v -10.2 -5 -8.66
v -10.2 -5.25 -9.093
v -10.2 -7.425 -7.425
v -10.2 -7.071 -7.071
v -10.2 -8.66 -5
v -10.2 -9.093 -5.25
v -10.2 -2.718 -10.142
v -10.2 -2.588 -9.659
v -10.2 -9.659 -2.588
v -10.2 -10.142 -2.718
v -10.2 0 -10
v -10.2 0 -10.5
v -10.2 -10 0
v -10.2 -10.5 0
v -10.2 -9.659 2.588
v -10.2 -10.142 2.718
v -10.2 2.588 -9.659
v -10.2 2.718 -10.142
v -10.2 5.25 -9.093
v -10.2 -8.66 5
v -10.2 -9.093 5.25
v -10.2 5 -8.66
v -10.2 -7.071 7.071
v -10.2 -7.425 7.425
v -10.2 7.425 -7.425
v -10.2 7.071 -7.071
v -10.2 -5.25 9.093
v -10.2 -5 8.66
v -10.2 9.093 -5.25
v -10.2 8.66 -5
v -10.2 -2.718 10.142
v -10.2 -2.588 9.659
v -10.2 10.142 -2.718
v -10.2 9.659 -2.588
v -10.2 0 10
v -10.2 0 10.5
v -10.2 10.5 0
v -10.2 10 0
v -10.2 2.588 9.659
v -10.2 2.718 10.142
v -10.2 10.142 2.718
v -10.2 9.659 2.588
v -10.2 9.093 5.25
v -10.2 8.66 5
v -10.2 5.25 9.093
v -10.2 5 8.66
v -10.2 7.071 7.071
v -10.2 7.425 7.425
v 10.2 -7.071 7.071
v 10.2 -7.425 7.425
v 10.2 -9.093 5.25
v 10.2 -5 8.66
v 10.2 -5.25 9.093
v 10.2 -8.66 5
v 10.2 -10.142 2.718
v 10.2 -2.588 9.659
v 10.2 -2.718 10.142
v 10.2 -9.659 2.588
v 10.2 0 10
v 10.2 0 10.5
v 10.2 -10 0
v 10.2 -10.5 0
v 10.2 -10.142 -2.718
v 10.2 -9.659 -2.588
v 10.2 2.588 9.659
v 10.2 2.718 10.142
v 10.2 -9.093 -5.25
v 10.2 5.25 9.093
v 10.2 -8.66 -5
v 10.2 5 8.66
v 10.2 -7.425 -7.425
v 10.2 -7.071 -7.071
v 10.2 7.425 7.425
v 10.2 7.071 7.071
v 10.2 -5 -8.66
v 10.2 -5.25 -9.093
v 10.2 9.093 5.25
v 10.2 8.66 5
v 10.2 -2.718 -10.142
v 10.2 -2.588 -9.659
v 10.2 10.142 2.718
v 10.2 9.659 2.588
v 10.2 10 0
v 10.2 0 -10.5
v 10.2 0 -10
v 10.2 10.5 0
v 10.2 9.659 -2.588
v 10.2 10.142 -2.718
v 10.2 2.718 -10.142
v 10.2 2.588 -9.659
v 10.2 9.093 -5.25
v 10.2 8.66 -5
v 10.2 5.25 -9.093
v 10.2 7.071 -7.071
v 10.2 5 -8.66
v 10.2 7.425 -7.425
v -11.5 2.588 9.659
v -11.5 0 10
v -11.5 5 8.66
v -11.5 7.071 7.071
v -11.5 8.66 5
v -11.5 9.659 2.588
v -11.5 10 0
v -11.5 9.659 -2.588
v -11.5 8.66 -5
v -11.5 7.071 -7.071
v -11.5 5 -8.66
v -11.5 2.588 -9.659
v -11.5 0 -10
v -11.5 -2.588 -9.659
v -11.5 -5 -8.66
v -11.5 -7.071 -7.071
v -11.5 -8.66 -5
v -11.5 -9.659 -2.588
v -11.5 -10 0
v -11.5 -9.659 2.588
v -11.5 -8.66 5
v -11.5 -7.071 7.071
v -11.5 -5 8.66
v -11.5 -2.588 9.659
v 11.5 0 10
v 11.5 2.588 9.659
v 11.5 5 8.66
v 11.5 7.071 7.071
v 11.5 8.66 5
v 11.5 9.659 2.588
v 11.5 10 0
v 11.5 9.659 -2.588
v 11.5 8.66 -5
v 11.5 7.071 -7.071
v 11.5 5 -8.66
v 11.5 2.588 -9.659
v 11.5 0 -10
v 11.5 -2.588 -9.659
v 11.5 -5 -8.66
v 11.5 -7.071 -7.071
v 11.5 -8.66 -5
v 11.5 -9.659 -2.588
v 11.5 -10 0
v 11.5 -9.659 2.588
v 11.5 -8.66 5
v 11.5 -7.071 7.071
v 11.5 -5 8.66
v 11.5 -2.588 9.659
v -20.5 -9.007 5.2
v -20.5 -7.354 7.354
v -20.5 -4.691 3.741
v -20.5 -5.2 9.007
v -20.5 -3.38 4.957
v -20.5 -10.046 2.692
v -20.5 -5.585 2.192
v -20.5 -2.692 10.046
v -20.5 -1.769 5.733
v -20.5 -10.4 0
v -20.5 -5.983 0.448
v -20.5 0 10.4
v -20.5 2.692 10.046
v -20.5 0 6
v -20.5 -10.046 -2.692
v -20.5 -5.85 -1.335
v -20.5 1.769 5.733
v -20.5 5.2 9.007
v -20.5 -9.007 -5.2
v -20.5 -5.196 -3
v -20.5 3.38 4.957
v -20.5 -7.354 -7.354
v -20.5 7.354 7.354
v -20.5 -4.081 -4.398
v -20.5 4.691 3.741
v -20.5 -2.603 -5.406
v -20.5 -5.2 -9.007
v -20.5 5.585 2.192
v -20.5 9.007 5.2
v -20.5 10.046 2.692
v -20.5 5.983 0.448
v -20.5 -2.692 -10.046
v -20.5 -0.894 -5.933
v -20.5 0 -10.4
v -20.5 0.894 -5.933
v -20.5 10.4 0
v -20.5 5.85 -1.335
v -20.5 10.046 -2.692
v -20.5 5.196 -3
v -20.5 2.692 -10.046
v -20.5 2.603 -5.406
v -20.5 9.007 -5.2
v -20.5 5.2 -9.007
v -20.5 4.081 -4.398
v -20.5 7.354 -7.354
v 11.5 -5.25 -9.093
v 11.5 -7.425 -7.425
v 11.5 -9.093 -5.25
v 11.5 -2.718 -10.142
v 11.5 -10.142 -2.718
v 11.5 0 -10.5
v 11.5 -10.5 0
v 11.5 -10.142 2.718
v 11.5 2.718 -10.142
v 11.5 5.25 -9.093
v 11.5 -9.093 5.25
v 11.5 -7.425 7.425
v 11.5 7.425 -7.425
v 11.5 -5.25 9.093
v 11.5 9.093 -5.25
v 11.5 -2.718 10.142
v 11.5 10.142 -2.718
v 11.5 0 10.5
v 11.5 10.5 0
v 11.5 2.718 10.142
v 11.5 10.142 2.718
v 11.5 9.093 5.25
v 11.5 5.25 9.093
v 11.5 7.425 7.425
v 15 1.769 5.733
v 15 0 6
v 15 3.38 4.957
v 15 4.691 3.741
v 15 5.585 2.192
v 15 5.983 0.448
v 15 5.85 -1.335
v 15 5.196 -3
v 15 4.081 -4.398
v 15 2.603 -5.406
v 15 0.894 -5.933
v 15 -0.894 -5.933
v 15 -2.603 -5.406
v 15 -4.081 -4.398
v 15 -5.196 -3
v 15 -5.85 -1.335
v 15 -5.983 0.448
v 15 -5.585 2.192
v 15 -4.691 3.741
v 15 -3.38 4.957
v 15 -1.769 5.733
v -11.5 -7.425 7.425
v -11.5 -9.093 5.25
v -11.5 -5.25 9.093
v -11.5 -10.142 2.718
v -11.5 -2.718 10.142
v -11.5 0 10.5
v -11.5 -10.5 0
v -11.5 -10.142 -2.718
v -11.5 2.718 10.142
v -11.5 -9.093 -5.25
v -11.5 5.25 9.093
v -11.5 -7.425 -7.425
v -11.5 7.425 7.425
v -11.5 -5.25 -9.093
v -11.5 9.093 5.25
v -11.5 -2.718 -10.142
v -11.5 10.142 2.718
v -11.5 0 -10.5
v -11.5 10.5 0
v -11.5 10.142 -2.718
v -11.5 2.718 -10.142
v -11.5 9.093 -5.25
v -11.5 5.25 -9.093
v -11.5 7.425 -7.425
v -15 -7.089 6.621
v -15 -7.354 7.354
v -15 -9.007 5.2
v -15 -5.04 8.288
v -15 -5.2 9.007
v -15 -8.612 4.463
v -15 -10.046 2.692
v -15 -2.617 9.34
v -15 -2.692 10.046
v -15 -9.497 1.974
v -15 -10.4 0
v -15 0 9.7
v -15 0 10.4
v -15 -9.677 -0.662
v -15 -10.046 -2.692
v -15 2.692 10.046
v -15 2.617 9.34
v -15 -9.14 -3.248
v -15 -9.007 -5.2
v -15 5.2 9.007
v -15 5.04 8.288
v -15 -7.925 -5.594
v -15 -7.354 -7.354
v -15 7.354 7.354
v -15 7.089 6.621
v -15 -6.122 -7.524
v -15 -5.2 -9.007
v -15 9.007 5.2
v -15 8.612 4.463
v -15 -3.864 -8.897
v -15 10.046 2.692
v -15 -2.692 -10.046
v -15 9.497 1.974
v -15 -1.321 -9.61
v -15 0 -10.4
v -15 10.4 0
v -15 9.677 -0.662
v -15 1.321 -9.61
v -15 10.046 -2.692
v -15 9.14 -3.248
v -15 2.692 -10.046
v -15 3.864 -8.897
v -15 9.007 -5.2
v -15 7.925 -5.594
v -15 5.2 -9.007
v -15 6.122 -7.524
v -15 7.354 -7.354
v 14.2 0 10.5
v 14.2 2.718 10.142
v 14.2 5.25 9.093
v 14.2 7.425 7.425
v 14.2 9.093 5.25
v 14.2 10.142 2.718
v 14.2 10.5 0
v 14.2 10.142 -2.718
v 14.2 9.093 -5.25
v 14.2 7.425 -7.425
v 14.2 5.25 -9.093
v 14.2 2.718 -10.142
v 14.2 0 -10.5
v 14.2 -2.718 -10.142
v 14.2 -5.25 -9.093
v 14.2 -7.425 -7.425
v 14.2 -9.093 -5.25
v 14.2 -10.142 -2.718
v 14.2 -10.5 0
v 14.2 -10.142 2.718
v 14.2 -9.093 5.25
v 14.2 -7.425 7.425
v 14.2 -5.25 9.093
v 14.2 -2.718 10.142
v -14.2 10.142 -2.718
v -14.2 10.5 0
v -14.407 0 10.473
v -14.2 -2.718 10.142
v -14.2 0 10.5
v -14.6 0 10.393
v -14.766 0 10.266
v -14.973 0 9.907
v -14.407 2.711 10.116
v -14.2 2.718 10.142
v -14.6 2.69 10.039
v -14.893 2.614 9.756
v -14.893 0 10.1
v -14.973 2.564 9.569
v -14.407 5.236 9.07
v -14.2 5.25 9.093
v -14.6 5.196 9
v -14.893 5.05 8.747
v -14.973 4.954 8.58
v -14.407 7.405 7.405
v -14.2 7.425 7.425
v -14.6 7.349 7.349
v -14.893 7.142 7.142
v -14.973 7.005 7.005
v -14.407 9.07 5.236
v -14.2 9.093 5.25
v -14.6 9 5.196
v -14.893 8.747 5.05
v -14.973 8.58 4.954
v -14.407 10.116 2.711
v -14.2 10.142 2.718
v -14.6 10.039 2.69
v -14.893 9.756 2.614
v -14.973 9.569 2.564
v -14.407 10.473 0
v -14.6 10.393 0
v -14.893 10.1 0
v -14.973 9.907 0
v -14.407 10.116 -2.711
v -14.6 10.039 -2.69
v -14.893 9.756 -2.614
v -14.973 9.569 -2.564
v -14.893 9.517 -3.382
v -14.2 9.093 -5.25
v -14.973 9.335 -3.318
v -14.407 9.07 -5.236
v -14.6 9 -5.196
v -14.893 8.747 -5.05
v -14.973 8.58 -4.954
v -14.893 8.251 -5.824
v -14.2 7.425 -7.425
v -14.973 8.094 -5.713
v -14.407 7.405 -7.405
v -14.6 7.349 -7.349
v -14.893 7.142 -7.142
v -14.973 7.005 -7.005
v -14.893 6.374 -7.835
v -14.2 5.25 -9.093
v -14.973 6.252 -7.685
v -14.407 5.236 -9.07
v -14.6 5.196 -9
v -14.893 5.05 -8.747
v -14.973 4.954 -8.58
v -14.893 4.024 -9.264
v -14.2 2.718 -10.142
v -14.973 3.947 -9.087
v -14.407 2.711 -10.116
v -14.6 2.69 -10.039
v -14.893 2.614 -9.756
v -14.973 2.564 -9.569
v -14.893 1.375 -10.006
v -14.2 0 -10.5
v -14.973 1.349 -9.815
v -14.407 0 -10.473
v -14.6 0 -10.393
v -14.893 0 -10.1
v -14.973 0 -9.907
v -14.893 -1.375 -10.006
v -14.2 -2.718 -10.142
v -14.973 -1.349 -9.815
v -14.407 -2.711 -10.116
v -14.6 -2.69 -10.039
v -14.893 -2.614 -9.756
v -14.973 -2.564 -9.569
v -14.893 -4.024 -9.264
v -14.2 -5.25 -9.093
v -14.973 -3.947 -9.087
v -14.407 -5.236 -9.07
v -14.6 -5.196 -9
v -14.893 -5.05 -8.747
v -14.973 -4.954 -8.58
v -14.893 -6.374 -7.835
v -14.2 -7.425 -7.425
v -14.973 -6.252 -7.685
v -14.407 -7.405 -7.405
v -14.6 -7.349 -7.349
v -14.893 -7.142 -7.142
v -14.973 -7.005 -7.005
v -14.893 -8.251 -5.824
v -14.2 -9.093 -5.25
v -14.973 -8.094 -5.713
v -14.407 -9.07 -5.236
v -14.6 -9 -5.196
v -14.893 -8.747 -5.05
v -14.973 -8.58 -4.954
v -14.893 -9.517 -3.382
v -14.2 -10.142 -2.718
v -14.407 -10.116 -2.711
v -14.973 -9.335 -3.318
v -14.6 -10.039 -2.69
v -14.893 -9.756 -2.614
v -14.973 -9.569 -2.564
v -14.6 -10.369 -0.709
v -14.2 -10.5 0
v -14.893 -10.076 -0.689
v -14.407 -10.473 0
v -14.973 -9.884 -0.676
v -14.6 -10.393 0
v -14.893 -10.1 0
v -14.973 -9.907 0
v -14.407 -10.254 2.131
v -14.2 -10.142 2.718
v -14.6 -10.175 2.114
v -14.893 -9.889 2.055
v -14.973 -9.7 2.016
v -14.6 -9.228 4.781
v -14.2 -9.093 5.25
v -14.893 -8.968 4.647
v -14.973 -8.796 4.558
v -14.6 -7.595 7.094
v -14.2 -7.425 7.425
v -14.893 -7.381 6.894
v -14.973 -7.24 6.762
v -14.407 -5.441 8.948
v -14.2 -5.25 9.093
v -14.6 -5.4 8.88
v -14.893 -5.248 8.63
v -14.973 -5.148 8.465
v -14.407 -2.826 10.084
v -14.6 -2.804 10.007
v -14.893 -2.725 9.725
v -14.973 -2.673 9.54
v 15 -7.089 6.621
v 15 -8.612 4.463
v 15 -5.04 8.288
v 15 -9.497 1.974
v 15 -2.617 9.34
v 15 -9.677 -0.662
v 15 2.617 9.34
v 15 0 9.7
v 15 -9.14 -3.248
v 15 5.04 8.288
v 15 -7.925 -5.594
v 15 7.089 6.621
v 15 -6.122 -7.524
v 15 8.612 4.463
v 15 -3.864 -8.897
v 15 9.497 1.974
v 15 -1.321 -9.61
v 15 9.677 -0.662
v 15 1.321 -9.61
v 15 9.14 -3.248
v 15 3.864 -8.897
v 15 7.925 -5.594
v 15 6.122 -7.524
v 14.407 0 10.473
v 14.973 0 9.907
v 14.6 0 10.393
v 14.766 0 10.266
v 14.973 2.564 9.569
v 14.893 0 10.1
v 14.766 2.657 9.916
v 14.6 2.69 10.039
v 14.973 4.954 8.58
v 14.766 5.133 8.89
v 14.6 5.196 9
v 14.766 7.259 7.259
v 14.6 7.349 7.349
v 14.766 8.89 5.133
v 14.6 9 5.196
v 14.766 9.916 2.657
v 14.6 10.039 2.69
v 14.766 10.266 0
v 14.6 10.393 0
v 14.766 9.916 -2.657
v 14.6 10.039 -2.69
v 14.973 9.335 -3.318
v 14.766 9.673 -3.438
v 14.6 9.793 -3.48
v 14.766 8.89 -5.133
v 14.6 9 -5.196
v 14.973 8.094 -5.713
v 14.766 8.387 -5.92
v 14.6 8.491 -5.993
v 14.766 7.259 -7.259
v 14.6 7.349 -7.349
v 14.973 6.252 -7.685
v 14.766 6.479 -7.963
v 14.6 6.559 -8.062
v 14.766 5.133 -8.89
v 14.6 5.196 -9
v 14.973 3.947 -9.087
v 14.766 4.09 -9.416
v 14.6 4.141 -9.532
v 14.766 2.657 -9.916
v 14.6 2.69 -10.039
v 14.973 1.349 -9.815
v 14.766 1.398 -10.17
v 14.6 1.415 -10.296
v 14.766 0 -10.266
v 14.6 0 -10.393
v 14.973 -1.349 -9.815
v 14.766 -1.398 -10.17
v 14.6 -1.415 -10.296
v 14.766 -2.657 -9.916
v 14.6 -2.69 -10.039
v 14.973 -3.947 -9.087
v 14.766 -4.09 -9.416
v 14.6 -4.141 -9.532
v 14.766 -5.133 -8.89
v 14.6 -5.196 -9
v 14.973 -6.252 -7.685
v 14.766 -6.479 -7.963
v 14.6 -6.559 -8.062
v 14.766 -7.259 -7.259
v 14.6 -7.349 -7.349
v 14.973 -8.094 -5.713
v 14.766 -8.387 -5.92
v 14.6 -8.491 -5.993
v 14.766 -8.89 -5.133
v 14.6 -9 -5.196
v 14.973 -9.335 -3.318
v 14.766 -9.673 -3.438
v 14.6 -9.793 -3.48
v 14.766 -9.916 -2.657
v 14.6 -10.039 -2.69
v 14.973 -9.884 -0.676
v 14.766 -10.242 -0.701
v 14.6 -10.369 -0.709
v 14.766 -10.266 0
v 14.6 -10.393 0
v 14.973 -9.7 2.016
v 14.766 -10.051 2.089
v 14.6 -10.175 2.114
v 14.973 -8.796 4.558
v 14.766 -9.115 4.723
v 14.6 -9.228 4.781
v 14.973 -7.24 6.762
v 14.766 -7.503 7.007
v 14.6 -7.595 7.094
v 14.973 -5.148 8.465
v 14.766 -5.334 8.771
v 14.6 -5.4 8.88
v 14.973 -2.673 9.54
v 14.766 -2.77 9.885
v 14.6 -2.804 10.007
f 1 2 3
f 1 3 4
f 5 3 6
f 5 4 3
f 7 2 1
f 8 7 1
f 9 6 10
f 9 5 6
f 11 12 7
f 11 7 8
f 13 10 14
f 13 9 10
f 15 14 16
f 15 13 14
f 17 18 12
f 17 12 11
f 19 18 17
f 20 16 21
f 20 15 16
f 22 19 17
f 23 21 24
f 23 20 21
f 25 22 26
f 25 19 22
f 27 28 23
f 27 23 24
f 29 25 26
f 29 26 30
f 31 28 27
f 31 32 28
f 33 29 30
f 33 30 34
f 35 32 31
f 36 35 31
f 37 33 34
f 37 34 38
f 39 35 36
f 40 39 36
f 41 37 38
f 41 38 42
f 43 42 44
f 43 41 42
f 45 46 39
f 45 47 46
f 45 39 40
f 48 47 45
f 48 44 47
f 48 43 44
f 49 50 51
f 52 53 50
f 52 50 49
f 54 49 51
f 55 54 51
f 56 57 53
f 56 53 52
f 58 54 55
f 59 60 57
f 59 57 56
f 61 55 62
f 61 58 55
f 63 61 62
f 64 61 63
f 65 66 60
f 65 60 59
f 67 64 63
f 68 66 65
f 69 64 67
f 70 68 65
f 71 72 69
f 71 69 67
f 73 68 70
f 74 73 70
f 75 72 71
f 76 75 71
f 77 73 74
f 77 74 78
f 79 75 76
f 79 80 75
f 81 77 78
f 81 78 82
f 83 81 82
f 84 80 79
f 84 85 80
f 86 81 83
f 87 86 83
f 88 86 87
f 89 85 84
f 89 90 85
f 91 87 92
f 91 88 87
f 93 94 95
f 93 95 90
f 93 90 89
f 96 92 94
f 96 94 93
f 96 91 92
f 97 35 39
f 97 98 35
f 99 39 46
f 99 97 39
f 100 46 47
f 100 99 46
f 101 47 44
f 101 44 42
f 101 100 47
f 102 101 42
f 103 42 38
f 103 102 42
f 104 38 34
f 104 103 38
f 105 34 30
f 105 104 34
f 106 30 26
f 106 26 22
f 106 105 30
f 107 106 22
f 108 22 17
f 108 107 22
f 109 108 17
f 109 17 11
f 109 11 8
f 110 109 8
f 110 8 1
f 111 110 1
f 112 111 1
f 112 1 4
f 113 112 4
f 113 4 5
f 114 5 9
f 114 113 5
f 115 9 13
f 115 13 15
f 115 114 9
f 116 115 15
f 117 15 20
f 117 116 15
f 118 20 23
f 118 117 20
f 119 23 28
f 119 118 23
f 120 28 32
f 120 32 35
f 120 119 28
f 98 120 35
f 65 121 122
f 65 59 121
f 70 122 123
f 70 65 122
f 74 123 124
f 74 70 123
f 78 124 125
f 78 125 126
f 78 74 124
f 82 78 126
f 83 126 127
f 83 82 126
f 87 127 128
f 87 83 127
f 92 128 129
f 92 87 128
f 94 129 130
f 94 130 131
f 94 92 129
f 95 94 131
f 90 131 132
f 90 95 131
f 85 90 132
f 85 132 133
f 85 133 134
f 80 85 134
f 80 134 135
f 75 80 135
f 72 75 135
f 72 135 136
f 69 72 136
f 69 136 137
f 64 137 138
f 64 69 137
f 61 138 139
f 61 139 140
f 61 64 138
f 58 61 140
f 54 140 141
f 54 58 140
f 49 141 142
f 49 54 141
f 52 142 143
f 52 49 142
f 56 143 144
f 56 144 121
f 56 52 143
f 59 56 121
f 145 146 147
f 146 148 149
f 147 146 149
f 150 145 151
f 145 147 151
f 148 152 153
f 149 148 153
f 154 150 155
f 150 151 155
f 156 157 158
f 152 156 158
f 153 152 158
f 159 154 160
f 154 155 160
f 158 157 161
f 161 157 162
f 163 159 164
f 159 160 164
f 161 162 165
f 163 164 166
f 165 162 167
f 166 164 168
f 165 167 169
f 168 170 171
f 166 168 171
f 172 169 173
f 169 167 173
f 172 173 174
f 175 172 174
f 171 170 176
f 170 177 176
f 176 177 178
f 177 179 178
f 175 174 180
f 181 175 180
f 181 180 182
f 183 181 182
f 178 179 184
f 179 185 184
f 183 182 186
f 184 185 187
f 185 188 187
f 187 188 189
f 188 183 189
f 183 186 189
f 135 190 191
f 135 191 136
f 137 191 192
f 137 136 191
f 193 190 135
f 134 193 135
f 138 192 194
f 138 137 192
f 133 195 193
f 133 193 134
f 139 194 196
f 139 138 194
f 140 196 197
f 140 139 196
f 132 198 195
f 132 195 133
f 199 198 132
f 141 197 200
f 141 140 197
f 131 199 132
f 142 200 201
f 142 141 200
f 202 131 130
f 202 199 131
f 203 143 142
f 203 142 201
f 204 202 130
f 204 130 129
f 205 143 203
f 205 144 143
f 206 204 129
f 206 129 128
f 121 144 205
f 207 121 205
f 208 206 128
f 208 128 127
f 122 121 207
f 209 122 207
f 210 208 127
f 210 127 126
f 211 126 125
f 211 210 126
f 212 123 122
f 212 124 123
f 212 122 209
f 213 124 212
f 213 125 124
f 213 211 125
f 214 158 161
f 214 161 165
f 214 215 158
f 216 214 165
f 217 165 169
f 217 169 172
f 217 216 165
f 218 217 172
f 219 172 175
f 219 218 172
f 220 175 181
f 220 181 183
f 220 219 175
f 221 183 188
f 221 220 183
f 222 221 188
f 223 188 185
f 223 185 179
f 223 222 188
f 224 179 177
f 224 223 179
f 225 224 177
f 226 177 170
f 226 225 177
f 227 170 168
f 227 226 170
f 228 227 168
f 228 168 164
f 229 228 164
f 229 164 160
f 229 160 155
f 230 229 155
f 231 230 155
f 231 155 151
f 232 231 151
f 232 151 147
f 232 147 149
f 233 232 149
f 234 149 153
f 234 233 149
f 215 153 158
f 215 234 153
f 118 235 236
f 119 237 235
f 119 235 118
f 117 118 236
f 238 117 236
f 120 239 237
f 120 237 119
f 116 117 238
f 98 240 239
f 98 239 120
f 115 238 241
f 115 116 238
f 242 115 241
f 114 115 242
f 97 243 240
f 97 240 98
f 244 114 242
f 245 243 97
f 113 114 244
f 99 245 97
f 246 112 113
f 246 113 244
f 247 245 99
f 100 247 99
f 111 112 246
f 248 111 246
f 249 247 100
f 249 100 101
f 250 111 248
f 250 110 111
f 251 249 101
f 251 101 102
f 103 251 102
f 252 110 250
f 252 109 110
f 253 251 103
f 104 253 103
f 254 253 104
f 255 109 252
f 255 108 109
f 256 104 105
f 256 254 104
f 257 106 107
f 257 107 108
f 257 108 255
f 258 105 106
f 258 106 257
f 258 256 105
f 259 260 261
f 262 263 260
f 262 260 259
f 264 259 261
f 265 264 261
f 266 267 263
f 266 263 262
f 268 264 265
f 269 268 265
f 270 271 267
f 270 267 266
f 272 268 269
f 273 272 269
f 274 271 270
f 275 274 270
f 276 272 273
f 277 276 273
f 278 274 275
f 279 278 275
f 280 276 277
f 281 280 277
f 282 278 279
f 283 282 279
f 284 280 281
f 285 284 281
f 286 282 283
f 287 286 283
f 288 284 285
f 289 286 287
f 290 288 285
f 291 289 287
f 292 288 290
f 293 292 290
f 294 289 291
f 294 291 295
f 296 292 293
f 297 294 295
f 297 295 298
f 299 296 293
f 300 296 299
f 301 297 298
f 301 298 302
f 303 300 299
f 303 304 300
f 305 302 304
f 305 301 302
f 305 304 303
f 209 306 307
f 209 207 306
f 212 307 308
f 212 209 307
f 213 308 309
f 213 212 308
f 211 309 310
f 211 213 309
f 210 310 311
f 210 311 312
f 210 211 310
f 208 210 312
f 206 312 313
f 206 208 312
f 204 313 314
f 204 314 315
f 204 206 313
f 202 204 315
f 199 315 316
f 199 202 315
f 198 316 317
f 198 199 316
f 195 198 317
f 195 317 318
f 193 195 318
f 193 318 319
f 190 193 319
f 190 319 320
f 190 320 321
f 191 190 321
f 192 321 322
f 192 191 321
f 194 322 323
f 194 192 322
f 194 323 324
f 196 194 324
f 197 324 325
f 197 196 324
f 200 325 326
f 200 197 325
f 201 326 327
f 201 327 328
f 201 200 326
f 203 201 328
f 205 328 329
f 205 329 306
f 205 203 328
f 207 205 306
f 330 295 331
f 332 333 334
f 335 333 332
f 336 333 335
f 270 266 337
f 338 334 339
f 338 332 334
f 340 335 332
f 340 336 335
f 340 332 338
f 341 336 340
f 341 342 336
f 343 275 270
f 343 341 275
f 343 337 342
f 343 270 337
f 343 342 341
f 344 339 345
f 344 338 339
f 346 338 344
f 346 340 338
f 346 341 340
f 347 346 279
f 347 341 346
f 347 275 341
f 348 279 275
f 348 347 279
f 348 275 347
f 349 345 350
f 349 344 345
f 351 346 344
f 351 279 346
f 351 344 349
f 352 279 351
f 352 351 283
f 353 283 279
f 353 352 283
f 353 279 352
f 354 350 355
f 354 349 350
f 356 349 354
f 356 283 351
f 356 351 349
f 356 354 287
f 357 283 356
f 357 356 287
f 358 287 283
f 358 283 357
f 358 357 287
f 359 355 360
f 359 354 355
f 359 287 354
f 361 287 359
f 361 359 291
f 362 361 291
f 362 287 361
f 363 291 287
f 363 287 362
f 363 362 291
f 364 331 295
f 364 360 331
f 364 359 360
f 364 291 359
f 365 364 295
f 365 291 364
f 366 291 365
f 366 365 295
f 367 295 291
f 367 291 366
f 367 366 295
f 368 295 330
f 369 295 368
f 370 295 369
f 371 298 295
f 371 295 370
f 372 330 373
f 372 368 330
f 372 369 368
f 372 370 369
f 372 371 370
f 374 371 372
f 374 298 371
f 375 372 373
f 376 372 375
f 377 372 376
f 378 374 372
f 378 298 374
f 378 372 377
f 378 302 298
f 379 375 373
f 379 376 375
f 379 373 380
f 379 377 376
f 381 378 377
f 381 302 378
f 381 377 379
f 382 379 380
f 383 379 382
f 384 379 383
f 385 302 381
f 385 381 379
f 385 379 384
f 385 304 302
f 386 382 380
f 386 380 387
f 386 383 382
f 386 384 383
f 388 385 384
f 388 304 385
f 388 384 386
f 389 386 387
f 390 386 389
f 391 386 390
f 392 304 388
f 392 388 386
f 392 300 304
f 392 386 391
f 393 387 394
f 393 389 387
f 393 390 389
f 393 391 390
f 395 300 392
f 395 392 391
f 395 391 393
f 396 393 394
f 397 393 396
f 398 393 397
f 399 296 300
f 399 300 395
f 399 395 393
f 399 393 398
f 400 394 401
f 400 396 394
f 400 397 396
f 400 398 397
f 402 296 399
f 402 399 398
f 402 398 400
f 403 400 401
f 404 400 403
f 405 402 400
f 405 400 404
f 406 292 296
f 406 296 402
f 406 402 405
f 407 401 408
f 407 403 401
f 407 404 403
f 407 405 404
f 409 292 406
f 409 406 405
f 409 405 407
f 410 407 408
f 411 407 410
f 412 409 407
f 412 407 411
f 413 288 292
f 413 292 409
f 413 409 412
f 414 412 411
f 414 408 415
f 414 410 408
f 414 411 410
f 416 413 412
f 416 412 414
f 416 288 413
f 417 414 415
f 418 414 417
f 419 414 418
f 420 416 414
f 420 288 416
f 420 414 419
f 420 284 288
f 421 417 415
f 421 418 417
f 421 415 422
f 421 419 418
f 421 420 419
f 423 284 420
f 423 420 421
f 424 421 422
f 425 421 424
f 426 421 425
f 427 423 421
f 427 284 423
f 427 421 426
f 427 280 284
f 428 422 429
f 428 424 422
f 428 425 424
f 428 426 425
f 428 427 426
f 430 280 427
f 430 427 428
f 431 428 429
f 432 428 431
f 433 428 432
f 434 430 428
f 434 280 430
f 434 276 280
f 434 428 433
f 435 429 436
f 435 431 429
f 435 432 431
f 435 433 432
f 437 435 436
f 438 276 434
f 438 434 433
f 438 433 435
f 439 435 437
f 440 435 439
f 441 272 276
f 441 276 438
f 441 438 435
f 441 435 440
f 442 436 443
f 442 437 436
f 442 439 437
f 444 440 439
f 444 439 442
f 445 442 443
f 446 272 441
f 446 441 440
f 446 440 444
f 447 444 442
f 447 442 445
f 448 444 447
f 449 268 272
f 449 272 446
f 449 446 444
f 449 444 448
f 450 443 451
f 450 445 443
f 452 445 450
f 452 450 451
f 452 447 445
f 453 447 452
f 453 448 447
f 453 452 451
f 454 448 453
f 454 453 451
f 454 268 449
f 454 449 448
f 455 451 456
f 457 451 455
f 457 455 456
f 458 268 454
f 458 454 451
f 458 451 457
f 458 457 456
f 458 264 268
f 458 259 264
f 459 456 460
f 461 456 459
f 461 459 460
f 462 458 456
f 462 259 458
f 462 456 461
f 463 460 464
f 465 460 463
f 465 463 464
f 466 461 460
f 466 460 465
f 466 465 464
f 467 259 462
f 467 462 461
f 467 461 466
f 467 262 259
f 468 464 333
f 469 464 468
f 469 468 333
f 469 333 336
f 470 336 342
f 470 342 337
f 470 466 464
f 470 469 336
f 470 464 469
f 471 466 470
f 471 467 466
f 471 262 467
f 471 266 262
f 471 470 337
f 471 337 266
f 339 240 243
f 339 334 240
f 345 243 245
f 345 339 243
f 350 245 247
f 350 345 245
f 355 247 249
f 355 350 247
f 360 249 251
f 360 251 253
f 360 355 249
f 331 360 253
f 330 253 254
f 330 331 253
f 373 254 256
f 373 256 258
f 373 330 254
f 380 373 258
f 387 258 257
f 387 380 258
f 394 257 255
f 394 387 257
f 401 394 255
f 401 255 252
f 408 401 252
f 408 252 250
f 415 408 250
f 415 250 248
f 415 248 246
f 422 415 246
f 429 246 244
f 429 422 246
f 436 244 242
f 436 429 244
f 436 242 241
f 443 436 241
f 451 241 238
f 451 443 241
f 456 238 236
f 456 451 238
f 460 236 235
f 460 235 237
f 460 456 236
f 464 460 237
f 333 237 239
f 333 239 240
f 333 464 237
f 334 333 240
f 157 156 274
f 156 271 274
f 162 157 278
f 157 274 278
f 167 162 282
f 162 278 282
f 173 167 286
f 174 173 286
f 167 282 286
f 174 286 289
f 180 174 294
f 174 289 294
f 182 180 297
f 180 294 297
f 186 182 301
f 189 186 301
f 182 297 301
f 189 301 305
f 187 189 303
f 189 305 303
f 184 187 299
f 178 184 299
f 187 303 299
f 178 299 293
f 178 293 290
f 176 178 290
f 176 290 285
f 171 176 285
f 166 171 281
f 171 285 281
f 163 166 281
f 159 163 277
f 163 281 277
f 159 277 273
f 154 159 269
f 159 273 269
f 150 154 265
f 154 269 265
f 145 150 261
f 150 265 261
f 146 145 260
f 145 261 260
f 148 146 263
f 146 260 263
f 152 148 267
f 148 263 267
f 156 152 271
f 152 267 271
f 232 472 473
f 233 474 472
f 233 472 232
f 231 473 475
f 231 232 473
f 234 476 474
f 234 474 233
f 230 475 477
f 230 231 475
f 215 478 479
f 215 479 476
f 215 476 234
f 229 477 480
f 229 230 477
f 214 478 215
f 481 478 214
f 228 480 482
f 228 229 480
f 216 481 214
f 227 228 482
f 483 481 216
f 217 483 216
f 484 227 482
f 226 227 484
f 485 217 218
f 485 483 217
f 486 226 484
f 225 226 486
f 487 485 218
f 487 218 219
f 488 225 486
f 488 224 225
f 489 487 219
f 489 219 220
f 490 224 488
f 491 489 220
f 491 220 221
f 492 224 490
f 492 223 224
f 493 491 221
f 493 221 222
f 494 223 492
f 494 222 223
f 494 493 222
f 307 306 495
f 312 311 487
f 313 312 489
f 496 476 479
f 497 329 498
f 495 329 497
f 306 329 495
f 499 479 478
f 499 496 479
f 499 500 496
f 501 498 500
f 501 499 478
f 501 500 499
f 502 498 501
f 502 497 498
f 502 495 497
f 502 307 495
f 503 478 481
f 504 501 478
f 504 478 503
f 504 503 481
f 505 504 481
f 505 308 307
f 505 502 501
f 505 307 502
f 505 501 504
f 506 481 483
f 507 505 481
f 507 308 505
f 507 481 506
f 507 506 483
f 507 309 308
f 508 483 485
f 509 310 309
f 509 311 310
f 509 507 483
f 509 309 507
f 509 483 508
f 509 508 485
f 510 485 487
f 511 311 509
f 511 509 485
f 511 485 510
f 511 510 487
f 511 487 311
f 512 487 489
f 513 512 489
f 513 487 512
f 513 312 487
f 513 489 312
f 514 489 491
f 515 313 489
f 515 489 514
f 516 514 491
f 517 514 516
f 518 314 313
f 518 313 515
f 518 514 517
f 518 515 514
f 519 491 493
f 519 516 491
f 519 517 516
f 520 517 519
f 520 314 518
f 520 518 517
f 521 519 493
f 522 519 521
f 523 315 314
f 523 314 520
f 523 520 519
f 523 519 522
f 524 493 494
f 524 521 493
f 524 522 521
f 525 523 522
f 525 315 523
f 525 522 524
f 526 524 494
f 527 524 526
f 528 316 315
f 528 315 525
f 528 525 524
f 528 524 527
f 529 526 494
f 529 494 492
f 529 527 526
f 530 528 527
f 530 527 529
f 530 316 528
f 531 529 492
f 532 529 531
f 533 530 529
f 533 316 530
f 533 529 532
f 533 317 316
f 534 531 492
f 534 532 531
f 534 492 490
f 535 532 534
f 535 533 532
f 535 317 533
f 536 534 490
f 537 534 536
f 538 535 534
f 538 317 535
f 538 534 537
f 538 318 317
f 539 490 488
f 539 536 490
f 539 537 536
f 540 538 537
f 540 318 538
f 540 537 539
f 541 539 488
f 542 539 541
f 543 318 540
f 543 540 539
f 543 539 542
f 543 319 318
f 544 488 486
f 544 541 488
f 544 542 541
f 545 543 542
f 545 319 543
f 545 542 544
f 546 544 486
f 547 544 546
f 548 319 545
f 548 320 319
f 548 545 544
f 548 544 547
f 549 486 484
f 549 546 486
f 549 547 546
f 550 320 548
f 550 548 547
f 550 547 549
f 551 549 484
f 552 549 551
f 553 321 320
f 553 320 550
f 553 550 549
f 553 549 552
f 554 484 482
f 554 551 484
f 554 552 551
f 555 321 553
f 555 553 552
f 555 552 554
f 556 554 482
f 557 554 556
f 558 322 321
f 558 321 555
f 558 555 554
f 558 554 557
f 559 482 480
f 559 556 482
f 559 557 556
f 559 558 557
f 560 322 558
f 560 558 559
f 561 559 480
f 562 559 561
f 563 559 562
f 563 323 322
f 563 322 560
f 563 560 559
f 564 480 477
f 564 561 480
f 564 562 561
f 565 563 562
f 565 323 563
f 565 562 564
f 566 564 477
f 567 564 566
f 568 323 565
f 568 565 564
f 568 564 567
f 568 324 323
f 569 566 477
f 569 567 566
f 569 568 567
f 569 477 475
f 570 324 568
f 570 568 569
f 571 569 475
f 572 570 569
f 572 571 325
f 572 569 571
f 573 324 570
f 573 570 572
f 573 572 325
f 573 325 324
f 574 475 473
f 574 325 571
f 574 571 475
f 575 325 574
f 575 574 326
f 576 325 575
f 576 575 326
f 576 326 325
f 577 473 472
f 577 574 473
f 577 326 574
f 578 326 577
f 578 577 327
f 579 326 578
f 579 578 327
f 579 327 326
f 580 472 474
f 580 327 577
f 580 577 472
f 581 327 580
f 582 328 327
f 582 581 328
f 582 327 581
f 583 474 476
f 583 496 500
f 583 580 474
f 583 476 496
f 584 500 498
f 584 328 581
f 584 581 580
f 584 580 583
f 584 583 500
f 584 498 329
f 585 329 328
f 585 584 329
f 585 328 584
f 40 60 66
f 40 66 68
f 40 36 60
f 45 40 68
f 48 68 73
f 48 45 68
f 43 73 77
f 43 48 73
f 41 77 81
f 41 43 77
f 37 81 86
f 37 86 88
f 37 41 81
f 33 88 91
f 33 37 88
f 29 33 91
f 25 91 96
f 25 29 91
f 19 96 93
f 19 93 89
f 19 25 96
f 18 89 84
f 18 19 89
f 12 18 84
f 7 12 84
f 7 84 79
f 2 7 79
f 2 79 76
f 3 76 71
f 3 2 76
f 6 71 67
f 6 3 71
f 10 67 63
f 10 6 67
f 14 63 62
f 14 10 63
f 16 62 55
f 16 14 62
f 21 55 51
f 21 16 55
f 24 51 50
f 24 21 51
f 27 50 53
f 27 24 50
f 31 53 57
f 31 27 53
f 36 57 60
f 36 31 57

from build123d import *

# Parameters (mm, degrees)
SKETCH2_W = 5.5
SKETCH2_H = 4.4


with BuildPart() as part:
    # Sketch1 → Revolve1 (revolve)
    with BuildSketch(Plane.XY, mode=Mode.PRIVATE) as revolve1_sk:
        with BuildLine():
            Line((-15, 9.7), (-15, 6))
            Line((-15, 6), (15, 6))
            Line((15, 6), (15, 9.7))
            ThreePointArc((15, 9.7), (14.765685425, 10.265685425), (14.2, 10.5))
            Line((14.2, 10.5), (11.5, 10.5))
            Line((11.5, 10.5), (11.5, 10))
            Line((11.5, 10), (10.2, 10))
            Line((10.2, 10), (10.2, 10.5))
            Line((10.2, 10.5), (-10.2, 10.5))
            Line((-10.2, 10.5), (-10.2, 10))
            Line((-10.2, 10), (-11.5, 10))
            Line((-11.5, 10), (-11.5, 10.5))
            Line((-11.5, 10.5), (-14.2, 10.5))
            ThreePointArc((-14.2, 10.5), (-14.765685425, 10.265685425), (-15, 9.7))
        make_face()
    revolve(revolve1_sk.sketch.rotate(Axis((15, 0, 0), (-1, 0, 0)), 270), axis=Axis((15, 0, 0), (-1, 0, 0)))

    # Sketch2 → Revolve2 (revolve)
    with BuildSketch(Plane.XY, mode=Mode.PRIVATE) as revolve2_sk:
        with Locations((-17.75, 8.2)):
            Rectangle(SKETCH2_W, SKETCH2_H)
    revolve(revolve2_sk.sketch.rotate(Axis((-15, 0, 0), (-1, 0, 0)), 270), axis=Axis((-15, 0, 0), (-1, 0, 0)))


solid = part.part
